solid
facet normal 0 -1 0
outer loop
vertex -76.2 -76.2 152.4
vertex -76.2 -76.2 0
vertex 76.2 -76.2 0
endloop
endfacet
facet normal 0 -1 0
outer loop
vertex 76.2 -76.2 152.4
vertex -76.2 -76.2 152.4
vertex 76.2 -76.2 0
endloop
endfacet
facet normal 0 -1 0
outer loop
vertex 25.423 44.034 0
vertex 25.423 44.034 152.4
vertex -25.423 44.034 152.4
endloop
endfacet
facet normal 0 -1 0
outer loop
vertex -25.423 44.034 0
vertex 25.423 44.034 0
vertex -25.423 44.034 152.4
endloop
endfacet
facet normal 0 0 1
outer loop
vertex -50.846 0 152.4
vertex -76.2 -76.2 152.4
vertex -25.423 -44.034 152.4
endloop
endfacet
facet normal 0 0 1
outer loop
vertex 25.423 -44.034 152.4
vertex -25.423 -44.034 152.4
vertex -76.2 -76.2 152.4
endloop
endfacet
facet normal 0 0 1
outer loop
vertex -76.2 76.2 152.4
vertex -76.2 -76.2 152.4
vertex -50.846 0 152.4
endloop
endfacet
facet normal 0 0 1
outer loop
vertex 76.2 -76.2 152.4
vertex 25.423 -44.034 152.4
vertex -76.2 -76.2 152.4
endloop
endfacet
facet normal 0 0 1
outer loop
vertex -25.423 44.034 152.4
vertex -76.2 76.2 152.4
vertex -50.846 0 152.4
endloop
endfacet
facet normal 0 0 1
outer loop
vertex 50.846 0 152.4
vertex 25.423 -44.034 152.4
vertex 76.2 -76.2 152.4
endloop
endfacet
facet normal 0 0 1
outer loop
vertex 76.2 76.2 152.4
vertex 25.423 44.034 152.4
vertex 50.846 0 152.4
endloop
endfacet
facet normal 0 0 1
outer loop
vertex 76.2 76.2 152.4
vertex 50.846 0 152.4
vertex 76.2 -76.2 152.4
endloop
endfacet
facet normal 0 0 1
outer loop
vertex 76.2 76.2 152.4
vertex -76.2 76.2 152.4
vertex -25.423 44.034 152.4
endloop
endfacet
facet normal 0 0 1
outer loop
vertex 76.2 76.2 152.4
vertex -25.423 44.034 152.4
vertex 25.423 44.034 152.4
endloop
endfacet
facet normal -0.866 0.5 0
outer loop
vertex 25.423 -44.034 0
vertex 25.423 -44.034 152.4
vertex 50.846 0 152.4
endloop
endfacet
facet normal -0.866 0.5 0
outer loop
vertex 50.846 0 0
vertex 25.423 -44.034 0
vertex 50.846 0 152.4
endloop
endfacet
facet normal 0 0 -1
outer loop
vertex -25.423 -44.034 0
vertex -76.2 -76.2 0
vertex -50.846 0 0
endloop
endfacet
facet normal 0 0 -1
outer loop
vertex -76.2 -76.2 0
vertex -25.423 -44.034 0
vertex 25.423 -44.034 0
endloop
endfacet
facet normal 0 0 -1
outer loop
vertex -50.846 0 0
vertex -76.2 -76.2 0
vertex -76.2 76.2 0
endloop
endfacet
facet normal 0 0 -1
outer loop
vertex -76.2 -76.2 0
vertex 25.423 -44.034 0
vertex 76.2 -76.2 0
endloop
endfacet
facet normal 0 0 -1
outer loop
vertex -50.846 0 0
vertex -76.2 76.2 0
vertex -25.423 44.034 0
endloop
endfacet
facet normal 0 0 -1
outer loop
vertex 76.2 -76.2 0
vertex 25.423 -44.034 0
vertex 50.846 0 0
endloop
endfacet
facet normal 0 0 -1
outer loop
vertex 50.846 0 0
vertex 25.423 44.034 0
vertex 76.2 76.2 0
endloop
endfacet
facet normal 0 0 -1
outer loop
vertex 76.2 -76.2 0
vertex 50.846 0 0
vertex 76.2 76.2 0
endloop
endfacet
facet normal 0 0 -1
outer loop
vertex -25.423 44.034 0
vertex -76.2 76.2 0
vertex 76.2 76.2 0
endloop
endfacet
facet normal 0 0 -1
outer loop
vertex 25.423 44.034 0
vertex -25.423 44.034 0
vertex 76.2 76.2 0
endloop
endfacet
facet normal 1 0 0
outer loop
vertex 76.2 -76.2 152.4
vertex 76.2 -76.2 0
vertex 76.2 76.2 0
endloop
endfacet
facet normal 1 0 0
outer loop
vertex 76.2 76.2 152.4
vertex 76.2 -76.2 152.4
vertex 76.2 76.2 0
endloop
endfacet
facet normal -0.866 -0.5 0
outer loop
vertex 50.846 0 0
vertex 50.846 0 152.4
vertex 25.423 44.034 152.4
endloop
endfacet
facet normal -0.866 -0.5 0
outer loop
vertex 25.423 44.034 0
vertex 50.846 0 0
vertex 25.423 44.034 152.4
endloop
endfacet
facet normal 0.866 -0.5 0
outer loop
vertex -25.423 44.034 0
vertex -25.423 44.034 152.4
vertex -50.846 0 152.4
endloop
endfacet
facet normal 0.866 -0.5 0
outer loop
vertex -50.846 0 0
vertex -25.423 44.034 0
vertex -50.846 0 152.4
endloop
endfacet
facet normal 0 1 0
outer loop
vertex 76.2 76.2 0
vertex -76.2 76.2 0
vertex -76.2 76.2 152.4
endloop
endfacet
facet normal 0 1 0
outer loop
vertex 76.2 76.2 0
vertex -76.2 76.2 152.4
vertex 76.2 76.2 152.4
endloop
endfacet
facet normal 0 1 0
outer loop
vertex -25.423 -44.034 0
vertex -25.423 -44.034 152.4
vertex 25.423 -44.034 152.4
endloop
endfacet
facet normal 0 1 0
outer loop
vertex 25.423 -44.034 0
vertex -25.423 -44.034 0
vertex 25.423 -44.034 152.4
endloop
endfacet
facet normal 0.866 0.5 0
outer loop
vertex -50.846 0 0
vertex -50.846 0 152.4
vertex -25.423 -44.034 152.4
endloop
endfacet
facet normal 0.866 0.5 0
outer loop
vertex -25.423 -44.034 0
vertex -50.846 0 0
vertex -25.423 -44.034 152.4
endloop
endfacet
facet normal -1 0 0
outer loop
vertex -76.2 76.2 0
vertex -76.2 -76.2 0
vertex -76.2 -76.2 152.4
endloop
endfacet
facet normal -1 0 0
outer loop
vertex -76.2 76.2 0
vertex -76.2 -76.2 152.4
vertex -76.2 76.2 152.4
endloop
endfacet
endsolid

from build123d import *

# Parameters (mm, degrees)
F0_W     = 152.4
F0_H     = 152.4
F1_DEPTH = 152.4
F3_DEPTH = 152.4


with BuildPart() as f1:
    # F0 (on Top) → F1 (new body)
    with BuildSketch(Plane.XY):
        Rectangle(F0_W, F0_H)
    extrude(amount=F1_DEPTH)

    # F2 (on face) → F3 (cut)
    with BuildSketch(Plane.XY.offset(152.4)):
        Polygon((-25.422659, 44.033968), (-50.845865, 0.000315), (-25.423205, -44.033653), (25.422659, -44.033968), (50.845865, -0.000315), (25.423205, 44.033653), align=None)
    extrude(amount=-F3_DEPTH, mode=Mode.SUBTRACT)


solid = f1.part
